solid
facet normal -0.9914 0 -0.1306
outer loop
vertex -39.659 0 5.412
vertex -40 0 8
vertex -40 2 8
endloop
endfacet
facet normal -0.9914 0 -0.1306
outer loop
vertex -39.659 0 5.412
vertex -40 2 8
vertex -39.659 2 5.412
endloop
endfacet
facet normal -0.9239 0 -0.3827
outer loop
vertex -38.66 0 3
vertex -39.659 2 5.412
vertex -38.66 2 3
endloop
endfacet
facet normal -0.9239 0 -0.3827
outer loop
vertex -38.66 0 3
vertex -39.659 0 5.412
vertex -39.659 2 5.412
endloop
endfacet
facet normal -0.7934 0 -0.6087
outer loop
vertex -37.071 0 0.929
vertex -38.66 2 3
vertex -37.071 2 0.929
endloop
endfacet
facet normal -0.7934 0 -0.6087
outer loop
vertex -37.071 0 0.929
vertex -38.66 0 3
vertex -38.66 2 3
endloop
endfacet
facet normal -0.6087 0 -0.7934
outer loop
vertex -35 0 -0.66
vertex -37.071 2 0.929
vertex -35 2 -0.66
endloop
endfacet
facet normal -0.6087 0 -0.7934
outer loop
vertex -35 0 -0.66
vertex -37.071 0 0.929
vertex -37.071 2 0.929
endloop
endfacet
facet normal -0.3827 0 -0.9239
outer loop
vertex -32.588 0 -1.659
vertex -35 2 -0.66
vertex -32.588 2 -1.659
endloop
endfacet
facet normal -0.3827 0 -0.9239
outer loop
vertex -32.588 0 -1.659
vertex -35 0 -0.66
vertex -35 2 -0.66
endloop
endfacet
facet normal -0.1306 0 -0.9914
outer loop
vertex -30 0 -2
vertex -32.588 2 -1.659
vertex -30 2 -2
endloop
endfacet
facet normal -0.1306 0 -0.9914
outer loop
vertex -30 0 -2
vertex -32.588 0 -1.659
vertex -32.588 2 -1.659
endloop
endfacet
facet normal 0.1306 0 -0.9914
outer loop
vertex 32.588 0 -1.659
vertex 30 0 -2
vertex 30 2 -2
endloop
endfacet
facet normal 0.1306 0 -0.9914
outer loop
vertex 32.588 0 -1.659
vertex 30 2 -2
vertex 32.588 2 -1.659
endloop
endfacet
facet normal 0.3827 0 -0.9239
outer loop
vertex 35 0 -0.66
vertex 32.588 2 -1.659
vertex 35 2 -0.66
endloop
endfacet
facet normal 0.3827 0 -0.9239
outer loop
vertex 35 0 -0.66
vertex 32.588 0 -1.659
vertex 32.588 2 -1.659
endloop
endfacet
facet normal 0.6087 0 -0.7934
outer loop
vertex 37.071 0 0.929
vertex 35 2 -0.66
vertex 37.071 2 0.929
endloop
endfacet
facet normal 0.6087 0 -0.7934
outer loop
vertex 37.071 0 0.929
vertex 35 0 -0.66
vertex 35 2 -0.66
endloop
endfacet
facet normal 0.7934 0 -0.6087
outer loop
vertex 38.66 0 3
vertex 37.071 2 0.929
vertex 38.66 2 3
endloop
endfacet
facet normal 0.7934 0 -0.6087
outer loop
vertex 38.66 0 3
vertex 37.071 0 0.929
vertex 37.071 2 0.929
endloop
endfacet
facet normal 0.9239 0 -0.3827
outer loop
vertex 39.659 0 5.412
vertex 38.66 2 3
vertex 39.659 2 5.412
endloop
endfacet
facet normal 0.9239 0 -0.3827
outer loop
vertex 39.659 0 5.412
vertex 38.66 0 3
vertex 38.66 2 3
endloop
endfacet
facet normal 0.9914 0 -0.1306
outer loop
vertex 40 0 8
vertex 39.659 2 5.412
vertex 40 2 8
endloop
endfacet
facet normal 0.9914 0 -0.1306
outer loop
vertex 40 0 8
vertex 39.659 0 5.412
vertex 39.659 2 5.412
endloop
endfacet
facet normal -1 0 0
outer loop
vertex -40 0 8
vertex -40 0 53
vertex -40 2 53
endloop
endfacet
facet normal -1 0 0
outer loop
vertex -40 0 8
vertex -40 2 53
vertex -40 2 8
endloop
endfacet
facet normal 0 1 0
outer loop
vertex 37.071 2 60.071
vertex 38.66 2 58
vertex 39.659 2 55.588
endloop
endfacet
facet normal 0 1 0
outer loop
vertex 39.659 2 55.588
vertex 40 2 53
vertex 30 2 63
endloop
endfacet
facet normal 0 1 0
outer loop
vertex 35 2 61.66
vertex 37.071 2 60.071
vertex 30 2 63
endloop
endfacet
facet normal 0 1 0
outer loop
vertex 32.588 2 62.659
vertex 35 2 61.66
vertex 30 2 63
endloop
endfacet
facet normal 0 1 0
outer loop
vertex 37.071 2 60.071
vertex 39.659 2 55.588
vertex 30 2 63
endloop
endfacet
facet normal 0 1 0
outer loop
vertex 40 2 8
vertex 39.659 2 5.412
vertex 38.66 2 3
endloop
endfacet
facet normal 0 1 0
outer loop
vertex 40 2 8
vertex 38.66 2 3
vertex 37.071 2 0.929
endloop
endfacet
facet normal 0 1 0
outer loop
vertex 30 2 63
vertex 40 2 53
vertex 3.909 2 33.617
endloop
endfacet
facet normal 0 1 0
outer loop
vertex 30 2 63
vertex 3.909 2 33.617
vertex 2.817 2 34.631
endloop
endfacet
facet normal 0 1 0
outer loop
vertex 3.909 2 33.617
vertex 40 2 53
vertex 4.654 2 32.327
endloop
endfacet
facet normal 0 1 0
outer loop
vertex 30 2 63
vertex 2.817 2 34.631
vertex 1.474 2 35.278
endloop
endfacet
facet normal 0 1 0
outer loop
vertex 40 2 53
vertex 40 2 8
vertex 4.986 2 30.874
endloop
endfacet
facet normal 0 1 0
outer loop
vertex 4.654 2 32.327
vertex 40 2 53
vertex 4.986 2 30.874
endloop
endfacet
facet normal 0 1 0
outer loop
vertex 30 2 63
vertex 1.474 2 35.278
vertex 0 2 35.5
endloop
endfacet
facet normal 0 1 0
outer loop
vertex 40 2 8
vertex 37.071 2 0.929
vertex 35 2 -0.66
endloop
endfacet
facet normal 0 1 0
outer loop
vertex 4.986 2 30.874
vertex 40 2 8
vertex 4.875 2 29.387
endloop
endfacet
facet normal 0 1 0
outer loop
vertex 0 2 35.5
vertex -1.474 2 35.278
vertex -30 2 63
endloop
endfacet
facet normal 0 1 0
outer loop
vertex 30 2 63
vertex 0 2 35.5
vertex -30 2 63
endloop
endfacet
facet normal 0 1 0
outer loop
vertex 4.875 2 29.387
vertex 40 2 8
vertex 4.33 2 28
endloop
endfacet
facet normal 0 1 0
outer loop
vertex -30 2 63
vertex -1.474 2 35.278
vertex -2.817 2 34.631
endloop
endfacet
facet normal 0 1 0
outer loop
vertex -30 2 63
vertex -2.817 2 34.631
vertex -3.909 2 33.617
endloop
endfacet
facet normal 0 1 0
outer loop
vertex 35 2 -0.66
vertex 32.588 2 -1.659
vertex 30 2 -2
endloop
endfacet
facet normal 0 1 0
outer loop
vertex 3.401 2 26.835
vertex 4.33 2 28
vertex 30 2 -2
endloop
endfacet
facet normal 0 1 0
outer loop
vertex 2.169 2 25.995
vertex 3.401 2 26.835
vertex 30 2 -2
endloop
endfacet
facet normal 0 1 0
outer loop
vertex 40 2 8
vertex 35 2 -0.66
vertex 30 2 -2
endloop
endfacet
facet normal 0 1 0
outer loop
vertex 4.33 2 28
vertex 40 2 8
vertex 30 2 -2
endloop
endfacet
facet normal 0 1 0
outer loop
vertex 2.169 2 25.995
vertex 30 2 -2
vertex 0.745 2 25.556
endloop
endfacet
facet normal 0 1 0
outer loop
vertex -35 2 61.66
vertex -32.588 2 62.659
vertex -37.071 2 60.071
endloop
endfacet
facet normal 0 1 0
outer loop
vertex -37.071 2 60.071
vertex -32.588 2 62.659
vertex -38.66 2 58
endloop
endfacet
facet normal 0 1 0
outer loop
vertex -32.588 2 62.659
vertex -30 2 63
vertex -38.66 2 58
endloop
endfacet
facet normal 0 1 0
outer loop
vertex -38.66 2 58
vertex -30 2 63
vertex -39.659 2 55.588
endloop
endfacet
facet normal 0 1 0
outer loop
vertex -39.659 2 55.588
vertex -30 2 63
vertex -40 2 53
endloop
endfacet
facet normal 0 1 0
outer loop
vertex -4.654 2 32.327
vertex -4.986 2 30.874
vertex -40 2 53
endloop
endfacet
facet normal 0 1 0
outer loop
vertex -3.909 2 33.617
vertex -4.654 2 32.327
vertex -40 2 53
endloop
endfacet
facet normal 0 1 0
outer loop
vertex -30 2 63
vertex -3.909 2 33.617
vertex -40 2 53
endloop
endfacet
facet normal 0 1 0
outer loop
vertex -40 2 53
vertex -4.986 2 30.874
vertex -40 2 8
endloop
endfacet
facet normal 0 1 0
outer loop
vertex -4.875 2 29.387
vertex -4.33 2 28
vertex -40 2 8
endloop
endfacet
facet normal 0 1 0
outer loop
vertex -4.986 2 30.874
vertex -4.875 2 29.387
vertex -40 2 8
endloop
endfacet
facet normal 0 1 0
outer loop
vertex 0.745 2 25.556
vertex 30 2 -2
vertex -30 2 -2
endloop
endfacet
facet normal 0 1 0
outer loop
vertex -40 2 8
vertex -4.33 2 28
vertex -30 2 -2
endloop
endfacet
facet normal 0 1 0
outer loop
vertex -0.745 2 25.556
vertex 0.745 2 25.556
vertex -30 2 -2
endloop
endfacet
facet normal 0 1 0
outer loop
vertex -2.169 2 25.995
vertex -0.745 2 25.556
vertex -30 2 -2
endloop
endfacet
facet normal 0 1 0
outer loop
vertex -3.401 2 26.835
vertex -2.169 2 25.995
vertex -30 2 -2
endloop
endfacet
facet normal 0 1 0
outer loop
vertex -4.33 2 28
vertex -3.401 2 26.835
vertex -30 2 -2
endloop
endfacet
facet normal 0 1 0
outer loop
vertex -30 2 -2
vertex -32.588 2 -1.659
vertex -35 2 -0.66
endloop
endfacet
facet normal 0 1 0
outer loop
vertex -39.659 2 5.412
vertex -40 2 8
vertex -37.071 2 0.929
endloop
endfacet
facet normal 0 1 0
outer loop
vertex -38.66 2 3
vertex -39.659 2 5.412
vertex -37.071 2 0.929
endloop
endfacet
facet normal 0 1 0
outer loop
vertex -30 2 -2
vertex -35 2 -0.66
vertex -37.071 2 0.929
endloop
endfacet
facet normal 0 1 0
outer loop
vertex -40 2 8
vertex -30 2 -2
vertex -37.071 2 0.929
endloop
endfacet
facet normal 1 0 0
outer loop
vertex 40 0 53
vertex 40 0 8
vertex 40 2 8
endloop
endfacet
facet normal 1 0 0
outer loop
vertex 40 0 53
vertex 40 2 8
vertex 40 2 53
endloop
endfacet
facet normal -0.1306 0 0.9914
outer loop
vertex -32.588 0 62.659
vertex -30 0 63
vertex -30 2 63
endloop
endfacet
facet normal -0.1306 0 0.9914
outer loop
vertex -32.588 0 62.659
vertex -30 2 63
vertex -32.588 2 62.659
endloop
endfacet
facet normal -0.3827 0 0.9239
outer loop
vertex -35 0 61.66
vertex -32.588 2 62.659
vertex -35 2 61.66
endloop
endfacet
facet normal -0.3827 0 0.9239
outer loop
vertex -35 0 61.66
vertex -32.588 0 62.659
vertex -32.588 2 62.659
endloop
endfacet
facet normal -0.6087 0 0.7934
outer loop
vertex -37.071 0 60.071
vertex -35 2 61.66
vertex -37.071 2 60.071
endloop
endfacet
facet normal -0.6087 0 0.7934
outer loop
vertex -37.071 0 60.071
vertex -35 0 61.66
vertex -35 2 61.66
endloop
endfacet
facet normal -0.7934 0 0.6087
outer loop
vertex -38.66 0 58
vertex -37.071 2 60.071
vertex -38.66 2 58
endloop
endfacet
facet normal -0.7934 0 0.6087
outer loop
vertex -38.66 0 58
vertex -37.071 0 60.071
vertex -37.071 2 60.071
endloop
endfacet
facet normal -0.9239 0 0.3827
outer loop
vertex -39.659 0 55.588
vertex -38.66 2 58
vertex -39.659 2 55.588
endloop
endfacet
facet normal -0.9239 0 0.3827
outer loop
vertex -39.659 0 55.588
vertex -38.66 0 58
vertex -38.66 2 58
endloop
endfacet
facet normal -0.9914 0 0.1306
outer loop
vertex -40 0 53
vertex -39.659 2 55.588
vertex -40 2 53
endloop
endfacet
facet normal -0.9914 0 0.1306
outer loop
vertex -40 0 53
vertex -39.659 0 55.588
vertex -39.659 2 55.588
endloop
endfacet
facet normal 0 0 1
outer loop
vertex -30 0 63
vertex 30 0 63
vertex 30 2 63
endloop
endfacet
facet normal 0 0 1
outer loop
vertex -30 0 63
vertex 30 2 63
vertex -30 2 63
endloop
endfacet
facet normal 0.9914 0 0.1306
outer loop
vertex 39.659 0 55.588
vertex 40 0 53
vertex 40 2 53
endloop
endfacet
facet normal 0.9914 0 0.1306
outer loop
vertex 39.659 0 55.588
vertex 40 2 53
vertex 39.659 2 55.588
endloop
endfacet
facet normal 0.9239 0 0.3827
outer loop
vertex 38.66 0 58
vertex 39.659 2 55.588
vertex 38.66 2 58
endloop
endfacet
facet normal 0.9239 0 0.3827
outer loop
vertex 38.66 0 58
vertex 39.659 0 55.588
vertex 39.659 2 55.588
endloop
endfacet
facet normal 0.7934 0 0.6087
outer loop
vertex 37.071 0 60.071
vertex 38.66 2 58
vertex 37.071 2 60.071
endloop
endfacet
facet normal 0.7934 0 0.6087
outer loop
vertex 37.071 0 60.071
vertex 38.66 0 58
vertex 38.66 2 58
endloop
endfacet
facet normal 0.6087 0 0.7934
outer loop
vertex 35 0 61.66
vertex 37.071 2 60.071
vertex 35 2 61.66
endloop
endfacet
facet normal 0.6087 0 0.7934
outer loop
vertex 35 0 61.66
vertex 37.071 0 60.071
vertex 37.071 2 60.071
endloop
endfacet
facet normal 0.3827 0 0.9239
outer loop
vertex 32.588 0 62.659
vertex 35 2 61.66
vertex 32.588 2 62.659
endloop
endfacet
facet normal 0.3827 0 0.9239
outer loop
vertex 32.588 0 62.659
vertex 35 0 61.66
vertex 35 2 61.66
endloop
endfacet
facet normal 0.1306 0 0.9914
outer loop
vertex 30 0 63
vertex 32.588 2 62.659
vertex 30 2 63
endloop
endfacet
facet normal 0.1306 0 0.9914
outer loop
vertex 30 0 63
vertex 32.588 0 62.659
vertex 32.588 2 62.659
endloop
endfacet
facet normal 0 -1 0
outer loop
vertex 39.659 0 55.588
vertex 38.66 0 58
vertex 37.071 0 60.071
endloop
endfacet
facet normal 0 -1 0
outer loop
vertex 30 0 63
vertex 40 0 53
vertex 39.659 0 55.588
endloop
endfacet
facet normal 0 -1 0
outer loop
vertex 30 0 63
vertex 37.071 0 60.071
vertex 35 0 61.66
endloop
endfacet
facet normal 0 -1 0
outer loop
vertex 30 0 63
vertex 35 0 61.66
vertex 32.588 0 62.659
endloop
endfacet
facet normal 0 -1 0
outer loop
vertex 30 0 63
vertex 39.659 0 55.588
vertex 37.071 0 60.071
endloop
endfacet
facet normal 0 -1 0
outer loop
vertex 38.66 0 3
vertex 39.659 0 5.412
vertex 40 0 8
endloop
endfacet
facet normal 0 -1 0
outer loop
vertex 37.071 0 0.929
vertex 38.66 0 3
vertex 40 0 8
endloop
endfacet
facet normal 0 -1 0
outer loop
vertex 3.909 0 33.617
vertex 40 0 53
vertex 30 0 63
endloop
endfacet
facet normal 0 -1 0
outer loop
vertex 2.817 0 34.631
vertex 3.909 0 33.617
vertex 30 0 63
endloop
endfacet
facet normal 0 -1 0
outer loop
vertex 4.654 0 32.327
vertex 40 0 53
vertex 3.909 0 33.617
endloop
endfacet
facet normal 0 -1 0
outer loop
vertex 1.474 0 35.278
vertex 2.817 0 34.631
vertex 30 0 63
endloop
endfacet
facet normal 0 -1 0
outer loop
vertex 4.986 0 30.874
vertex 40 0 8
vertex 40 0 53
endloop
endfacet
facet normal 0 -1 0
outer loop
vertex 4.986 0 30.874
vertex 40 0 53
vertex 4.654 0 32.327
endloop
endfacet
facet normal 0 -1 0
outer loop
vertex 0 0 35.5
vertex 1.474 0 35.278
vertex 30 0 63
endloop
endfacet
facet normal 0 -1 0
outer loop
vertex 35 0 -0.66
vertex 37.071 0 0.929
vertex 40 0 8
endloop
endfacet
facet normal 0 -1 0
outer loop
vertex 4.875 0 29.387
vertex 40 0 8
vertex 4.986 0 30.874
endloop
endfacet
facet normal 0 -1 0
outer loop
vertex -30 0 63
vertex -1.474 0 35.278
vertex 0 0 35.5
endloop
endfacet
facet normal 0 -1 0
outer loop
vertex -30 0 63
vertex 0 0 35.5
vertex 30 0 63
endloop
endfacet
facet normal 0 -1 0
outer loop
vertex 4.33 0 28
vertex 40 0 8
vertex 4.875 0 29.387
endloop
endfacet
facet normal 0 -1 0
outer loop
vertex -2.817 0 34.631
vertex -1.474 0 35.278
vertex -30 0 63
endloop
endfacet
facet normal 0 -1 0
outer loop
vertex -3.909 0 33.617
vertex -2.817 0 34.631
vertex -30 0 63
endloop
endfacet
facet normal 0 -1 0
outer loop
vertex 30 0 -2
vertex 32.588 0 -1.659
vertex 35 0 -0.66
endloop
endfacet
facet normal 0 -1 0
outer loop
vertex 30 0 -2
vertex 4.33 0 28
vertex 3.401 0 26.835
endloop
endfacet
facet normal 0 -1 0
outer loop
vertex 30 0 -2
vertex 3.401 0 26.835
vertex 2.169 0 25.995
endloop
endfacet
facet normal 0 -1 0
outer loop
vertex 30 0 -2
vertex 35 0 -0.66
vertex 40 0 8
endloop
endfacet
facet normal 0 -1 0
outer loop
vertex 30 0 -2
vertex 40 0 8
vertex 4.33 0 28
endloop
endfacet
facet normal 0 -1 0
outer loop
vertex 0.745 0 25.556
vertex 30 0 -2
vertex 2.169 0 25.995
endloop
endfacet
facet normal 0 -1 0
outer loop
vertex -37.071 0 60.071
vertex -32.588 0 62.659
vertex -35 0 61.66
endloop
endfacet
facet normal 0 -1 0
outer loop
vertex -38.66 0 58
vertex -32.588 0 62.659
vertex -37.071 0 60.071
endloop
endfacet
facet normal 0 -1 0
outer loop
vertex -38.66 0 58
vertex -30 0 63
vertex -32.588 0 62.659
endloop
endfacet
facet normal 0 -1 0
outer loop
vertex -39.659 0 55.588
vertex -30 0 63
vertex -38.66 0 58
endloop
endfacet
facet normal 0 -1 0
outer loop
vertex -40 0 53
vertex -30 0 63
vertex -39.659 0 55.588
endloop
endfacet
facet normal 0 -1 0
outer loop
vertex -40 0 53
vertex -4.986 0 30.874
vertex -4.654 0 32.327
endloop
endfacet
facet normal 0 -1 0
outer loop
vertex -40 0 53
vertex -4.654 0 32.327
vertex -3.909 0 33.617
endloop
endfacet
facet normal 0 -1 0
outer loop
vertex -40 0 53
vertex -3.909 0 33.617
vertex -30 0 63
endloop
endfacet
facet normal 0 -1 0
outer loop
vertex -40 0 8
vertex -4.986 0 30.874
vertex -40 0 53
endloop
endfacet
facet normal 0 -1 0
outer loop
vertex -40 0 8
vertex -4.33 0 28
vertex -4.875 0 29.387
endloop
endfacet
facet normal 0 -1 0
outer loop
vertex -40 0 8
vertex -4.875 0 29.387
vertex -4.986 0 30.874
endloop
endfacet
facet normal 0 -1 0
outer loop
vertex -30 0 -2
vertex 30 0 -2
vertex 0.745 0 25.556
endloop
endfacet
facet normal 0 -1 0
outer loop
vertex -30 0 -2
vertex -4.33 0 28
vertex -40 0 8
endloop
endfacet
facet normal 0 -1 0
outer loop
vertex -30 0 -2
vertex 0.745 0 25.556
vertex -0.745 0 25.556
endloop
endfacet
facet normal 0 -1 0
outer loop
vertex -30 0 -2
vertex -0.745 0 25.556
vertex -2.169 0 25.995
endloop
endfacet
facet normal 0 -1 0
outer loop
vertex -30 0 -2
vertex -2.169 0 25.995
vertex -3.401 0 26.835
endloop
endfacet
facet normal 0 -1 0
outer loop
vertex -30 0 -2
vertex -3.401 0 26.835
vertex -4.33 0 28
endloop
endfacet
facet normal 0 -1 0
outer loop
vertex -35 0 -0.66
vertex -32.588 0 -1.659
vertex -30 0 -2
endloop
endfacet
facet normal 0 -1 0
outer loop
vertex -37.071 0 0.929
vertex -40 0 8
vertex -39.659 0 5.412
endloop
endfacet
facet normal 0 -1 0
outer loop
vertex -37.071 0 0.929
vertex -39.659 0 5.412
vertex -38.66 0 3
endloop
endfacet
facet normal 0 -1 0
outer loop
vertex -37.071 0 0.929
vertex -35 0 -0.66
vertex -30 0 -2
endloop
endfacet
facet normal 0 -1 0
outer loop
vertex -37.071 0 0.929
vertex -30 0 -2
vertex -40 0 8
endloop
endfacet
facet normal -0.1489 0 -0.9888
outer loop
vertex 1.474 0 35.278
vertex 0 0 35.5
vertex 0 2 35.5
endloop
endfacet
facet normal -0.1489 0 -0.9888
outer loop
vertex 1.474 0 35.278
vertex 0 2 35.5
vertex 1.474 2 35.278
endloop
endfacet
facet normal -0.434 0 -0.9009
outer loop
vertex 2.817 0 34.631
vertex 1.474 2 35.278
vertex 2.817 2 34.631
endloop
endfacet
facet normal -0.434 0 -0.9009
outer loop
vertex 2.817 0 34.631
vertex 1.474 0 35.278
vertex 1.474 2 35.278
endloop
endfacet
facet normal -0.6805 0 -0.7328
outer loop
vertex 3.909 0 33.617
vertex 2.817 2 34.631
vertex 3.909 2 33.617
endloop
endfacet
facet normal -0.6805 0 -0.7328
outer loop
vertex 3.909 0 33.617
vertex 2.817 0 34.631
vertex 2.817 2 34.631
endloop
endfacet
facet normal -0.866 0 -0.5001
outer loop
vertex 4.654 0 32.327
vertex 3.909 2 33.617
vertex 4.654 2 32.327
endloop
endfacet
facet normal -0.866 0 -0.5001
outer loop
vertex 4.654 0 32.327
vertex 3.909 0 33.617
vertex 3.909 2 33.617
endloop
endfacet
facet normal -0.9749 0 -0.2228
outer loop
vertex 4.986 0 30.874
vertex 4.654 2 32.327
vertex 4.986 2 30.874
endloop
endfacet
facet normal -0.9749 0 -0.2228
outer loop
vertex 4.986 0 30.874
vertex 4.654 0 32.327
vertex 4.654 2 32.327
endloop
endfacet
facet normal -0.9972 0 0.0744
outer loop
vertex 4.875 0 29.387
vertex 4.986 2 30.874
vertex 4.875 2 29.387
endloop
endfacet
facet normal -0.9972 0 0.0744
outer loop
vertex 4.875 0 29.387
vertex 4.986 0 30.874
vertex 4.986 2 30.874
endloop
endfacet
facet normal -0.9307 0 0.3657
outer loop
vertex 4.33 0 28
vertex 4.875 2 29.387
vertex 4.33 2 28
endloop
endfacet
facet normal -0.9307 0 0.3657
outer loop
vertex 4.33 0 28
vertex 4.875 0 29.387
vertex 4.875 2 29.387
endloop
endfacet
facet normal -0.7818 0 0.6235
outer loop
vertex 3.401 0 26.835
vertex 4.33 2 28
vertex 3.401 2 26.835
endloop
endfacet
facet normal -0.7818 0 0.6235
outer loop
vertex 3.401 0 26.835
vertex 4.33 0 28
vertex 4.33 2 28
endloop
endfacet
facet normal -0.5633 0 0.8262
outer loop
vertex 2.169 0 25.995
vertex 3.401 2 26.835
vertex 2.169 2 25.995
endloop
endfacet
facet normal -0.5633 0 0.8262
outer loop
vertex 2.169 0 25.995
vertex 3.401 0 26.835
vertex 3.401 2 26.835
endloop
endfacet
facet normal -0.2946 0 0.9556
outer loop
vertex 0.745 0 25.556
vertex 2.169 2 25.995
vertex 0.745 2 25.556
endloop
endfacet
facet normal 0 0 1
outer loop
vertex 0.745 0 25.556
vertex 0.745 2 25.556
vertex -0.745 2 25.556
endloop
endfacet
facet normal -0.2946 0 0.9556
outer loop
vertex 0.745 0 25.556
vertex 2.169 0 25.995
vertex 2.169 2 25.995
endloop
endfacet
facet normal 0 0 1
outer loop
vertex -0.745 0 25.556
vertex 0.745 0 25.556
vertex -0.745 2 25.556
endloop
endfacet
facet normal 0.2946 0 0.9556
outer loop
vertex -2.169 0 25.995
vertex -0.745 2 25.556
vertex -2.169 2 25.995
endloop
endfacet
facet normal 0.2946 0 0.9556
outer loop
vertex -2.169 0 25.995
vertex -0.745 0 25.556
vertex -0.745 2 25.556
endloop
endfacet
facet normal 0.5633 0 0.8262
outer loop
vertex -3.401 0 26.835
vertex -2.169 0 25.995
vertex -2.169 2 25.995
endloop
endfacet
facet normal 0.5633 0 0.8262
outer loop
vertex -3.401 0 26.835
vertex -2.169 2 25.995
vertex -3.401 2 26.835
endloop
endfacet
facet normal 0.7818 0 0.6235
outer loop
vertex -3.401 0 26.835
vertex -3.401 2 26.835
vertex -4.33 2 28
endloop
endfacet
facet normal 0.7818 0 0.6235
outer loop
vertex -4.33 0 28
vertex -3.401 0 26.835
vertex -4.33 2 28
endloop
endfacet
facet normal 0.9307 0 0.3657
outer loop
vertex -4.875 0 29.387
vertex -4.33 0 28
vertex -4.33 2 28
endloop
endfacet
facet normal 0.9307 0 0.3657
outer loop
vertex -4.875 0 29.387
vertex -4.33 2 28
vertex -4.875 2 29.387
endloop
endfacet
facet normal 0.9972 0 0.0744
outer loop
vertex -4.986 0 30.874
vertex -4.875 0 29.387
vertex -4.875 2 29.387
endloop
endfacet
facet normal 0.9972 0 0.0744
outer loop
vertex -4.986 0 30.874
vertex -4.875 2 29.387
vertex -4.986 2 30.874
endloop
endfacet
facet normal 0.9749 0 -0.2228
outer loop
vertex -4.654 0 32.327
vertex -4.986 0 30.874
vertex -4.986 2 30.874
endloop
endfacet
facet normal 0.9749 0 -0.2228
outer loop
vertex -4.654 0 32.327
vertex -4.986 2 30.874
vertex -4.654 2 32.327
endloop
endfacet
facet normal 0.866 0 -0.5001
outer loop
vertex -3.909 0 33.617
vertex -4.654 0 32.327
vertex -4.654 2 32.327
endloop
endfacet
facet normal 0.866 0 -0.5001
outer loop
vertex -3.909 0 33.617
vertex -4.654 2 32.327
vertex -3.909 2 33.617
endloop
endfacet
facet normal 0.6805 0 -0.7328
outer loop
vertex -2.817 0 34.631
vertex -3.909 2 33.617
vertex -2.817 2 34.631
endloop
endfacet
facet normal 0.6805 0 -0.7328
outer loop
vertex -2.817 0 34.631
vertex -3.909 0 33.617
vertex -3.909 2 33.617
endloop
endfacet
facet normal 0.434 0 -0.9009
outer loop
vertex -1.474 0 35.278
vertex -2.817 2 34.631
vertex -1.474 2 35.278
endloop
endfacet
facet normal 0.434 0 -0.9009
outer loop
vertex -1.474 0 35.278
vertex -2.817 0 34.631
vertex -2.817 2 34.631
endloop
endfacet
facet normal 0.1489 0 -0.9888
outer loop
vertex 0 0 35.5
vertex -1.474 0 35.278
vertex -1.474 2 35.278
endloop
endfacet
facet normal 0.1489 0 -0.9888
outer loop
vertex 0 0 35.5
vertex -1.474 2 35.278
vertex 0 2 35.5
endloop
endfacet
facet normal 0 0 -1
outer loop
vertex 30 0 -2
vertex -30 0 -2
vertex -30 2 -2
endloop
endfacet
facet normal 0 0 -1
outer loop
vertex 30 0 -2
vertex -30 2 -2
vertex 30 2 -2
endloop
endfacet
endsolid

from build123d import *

# Parameters (mm, degrees)
SKETCH_10_R     = 5
EXTRUDE_1_DEPTH = 2


with BuildPart() as part:
    # Эскиз10 → Вытянуть1 (new body)
    with BuildSketch(Plane(origin=(0, 0, 0), x_dir=(1, 0, 0), z_dir=(0, 1, 0))):
        with BuildLine():
            Line((-30, 2), (30, 2))
            ThreePointArc((30, 2), (37.071067812, -0.928932188), (40, -8))
            Line((40, -8), (40, -53))
            ThreePointArc((40, -53), (37.071067812, -60.071067812), (30, -63))
            Line((30, -63), (-30, -63))
            ThreePointArc((-30, -63), (-37.071067812, -60.071067812), (-40, -53))
            Line((-40, -53), (-40, -8))
            ThreePointArc((-40, -8), (-37.071067812, -0.928932188), (-30, 2))
        make_face()
        with Locations(Location((0, -30.5, 0), (0, 0, 270))):
            Circle(SKETCH_10_R, mode=Mode.SUBTRACT)
    extrude(amount=EXTRUDE_1_DEPTH)


solid = part.part
